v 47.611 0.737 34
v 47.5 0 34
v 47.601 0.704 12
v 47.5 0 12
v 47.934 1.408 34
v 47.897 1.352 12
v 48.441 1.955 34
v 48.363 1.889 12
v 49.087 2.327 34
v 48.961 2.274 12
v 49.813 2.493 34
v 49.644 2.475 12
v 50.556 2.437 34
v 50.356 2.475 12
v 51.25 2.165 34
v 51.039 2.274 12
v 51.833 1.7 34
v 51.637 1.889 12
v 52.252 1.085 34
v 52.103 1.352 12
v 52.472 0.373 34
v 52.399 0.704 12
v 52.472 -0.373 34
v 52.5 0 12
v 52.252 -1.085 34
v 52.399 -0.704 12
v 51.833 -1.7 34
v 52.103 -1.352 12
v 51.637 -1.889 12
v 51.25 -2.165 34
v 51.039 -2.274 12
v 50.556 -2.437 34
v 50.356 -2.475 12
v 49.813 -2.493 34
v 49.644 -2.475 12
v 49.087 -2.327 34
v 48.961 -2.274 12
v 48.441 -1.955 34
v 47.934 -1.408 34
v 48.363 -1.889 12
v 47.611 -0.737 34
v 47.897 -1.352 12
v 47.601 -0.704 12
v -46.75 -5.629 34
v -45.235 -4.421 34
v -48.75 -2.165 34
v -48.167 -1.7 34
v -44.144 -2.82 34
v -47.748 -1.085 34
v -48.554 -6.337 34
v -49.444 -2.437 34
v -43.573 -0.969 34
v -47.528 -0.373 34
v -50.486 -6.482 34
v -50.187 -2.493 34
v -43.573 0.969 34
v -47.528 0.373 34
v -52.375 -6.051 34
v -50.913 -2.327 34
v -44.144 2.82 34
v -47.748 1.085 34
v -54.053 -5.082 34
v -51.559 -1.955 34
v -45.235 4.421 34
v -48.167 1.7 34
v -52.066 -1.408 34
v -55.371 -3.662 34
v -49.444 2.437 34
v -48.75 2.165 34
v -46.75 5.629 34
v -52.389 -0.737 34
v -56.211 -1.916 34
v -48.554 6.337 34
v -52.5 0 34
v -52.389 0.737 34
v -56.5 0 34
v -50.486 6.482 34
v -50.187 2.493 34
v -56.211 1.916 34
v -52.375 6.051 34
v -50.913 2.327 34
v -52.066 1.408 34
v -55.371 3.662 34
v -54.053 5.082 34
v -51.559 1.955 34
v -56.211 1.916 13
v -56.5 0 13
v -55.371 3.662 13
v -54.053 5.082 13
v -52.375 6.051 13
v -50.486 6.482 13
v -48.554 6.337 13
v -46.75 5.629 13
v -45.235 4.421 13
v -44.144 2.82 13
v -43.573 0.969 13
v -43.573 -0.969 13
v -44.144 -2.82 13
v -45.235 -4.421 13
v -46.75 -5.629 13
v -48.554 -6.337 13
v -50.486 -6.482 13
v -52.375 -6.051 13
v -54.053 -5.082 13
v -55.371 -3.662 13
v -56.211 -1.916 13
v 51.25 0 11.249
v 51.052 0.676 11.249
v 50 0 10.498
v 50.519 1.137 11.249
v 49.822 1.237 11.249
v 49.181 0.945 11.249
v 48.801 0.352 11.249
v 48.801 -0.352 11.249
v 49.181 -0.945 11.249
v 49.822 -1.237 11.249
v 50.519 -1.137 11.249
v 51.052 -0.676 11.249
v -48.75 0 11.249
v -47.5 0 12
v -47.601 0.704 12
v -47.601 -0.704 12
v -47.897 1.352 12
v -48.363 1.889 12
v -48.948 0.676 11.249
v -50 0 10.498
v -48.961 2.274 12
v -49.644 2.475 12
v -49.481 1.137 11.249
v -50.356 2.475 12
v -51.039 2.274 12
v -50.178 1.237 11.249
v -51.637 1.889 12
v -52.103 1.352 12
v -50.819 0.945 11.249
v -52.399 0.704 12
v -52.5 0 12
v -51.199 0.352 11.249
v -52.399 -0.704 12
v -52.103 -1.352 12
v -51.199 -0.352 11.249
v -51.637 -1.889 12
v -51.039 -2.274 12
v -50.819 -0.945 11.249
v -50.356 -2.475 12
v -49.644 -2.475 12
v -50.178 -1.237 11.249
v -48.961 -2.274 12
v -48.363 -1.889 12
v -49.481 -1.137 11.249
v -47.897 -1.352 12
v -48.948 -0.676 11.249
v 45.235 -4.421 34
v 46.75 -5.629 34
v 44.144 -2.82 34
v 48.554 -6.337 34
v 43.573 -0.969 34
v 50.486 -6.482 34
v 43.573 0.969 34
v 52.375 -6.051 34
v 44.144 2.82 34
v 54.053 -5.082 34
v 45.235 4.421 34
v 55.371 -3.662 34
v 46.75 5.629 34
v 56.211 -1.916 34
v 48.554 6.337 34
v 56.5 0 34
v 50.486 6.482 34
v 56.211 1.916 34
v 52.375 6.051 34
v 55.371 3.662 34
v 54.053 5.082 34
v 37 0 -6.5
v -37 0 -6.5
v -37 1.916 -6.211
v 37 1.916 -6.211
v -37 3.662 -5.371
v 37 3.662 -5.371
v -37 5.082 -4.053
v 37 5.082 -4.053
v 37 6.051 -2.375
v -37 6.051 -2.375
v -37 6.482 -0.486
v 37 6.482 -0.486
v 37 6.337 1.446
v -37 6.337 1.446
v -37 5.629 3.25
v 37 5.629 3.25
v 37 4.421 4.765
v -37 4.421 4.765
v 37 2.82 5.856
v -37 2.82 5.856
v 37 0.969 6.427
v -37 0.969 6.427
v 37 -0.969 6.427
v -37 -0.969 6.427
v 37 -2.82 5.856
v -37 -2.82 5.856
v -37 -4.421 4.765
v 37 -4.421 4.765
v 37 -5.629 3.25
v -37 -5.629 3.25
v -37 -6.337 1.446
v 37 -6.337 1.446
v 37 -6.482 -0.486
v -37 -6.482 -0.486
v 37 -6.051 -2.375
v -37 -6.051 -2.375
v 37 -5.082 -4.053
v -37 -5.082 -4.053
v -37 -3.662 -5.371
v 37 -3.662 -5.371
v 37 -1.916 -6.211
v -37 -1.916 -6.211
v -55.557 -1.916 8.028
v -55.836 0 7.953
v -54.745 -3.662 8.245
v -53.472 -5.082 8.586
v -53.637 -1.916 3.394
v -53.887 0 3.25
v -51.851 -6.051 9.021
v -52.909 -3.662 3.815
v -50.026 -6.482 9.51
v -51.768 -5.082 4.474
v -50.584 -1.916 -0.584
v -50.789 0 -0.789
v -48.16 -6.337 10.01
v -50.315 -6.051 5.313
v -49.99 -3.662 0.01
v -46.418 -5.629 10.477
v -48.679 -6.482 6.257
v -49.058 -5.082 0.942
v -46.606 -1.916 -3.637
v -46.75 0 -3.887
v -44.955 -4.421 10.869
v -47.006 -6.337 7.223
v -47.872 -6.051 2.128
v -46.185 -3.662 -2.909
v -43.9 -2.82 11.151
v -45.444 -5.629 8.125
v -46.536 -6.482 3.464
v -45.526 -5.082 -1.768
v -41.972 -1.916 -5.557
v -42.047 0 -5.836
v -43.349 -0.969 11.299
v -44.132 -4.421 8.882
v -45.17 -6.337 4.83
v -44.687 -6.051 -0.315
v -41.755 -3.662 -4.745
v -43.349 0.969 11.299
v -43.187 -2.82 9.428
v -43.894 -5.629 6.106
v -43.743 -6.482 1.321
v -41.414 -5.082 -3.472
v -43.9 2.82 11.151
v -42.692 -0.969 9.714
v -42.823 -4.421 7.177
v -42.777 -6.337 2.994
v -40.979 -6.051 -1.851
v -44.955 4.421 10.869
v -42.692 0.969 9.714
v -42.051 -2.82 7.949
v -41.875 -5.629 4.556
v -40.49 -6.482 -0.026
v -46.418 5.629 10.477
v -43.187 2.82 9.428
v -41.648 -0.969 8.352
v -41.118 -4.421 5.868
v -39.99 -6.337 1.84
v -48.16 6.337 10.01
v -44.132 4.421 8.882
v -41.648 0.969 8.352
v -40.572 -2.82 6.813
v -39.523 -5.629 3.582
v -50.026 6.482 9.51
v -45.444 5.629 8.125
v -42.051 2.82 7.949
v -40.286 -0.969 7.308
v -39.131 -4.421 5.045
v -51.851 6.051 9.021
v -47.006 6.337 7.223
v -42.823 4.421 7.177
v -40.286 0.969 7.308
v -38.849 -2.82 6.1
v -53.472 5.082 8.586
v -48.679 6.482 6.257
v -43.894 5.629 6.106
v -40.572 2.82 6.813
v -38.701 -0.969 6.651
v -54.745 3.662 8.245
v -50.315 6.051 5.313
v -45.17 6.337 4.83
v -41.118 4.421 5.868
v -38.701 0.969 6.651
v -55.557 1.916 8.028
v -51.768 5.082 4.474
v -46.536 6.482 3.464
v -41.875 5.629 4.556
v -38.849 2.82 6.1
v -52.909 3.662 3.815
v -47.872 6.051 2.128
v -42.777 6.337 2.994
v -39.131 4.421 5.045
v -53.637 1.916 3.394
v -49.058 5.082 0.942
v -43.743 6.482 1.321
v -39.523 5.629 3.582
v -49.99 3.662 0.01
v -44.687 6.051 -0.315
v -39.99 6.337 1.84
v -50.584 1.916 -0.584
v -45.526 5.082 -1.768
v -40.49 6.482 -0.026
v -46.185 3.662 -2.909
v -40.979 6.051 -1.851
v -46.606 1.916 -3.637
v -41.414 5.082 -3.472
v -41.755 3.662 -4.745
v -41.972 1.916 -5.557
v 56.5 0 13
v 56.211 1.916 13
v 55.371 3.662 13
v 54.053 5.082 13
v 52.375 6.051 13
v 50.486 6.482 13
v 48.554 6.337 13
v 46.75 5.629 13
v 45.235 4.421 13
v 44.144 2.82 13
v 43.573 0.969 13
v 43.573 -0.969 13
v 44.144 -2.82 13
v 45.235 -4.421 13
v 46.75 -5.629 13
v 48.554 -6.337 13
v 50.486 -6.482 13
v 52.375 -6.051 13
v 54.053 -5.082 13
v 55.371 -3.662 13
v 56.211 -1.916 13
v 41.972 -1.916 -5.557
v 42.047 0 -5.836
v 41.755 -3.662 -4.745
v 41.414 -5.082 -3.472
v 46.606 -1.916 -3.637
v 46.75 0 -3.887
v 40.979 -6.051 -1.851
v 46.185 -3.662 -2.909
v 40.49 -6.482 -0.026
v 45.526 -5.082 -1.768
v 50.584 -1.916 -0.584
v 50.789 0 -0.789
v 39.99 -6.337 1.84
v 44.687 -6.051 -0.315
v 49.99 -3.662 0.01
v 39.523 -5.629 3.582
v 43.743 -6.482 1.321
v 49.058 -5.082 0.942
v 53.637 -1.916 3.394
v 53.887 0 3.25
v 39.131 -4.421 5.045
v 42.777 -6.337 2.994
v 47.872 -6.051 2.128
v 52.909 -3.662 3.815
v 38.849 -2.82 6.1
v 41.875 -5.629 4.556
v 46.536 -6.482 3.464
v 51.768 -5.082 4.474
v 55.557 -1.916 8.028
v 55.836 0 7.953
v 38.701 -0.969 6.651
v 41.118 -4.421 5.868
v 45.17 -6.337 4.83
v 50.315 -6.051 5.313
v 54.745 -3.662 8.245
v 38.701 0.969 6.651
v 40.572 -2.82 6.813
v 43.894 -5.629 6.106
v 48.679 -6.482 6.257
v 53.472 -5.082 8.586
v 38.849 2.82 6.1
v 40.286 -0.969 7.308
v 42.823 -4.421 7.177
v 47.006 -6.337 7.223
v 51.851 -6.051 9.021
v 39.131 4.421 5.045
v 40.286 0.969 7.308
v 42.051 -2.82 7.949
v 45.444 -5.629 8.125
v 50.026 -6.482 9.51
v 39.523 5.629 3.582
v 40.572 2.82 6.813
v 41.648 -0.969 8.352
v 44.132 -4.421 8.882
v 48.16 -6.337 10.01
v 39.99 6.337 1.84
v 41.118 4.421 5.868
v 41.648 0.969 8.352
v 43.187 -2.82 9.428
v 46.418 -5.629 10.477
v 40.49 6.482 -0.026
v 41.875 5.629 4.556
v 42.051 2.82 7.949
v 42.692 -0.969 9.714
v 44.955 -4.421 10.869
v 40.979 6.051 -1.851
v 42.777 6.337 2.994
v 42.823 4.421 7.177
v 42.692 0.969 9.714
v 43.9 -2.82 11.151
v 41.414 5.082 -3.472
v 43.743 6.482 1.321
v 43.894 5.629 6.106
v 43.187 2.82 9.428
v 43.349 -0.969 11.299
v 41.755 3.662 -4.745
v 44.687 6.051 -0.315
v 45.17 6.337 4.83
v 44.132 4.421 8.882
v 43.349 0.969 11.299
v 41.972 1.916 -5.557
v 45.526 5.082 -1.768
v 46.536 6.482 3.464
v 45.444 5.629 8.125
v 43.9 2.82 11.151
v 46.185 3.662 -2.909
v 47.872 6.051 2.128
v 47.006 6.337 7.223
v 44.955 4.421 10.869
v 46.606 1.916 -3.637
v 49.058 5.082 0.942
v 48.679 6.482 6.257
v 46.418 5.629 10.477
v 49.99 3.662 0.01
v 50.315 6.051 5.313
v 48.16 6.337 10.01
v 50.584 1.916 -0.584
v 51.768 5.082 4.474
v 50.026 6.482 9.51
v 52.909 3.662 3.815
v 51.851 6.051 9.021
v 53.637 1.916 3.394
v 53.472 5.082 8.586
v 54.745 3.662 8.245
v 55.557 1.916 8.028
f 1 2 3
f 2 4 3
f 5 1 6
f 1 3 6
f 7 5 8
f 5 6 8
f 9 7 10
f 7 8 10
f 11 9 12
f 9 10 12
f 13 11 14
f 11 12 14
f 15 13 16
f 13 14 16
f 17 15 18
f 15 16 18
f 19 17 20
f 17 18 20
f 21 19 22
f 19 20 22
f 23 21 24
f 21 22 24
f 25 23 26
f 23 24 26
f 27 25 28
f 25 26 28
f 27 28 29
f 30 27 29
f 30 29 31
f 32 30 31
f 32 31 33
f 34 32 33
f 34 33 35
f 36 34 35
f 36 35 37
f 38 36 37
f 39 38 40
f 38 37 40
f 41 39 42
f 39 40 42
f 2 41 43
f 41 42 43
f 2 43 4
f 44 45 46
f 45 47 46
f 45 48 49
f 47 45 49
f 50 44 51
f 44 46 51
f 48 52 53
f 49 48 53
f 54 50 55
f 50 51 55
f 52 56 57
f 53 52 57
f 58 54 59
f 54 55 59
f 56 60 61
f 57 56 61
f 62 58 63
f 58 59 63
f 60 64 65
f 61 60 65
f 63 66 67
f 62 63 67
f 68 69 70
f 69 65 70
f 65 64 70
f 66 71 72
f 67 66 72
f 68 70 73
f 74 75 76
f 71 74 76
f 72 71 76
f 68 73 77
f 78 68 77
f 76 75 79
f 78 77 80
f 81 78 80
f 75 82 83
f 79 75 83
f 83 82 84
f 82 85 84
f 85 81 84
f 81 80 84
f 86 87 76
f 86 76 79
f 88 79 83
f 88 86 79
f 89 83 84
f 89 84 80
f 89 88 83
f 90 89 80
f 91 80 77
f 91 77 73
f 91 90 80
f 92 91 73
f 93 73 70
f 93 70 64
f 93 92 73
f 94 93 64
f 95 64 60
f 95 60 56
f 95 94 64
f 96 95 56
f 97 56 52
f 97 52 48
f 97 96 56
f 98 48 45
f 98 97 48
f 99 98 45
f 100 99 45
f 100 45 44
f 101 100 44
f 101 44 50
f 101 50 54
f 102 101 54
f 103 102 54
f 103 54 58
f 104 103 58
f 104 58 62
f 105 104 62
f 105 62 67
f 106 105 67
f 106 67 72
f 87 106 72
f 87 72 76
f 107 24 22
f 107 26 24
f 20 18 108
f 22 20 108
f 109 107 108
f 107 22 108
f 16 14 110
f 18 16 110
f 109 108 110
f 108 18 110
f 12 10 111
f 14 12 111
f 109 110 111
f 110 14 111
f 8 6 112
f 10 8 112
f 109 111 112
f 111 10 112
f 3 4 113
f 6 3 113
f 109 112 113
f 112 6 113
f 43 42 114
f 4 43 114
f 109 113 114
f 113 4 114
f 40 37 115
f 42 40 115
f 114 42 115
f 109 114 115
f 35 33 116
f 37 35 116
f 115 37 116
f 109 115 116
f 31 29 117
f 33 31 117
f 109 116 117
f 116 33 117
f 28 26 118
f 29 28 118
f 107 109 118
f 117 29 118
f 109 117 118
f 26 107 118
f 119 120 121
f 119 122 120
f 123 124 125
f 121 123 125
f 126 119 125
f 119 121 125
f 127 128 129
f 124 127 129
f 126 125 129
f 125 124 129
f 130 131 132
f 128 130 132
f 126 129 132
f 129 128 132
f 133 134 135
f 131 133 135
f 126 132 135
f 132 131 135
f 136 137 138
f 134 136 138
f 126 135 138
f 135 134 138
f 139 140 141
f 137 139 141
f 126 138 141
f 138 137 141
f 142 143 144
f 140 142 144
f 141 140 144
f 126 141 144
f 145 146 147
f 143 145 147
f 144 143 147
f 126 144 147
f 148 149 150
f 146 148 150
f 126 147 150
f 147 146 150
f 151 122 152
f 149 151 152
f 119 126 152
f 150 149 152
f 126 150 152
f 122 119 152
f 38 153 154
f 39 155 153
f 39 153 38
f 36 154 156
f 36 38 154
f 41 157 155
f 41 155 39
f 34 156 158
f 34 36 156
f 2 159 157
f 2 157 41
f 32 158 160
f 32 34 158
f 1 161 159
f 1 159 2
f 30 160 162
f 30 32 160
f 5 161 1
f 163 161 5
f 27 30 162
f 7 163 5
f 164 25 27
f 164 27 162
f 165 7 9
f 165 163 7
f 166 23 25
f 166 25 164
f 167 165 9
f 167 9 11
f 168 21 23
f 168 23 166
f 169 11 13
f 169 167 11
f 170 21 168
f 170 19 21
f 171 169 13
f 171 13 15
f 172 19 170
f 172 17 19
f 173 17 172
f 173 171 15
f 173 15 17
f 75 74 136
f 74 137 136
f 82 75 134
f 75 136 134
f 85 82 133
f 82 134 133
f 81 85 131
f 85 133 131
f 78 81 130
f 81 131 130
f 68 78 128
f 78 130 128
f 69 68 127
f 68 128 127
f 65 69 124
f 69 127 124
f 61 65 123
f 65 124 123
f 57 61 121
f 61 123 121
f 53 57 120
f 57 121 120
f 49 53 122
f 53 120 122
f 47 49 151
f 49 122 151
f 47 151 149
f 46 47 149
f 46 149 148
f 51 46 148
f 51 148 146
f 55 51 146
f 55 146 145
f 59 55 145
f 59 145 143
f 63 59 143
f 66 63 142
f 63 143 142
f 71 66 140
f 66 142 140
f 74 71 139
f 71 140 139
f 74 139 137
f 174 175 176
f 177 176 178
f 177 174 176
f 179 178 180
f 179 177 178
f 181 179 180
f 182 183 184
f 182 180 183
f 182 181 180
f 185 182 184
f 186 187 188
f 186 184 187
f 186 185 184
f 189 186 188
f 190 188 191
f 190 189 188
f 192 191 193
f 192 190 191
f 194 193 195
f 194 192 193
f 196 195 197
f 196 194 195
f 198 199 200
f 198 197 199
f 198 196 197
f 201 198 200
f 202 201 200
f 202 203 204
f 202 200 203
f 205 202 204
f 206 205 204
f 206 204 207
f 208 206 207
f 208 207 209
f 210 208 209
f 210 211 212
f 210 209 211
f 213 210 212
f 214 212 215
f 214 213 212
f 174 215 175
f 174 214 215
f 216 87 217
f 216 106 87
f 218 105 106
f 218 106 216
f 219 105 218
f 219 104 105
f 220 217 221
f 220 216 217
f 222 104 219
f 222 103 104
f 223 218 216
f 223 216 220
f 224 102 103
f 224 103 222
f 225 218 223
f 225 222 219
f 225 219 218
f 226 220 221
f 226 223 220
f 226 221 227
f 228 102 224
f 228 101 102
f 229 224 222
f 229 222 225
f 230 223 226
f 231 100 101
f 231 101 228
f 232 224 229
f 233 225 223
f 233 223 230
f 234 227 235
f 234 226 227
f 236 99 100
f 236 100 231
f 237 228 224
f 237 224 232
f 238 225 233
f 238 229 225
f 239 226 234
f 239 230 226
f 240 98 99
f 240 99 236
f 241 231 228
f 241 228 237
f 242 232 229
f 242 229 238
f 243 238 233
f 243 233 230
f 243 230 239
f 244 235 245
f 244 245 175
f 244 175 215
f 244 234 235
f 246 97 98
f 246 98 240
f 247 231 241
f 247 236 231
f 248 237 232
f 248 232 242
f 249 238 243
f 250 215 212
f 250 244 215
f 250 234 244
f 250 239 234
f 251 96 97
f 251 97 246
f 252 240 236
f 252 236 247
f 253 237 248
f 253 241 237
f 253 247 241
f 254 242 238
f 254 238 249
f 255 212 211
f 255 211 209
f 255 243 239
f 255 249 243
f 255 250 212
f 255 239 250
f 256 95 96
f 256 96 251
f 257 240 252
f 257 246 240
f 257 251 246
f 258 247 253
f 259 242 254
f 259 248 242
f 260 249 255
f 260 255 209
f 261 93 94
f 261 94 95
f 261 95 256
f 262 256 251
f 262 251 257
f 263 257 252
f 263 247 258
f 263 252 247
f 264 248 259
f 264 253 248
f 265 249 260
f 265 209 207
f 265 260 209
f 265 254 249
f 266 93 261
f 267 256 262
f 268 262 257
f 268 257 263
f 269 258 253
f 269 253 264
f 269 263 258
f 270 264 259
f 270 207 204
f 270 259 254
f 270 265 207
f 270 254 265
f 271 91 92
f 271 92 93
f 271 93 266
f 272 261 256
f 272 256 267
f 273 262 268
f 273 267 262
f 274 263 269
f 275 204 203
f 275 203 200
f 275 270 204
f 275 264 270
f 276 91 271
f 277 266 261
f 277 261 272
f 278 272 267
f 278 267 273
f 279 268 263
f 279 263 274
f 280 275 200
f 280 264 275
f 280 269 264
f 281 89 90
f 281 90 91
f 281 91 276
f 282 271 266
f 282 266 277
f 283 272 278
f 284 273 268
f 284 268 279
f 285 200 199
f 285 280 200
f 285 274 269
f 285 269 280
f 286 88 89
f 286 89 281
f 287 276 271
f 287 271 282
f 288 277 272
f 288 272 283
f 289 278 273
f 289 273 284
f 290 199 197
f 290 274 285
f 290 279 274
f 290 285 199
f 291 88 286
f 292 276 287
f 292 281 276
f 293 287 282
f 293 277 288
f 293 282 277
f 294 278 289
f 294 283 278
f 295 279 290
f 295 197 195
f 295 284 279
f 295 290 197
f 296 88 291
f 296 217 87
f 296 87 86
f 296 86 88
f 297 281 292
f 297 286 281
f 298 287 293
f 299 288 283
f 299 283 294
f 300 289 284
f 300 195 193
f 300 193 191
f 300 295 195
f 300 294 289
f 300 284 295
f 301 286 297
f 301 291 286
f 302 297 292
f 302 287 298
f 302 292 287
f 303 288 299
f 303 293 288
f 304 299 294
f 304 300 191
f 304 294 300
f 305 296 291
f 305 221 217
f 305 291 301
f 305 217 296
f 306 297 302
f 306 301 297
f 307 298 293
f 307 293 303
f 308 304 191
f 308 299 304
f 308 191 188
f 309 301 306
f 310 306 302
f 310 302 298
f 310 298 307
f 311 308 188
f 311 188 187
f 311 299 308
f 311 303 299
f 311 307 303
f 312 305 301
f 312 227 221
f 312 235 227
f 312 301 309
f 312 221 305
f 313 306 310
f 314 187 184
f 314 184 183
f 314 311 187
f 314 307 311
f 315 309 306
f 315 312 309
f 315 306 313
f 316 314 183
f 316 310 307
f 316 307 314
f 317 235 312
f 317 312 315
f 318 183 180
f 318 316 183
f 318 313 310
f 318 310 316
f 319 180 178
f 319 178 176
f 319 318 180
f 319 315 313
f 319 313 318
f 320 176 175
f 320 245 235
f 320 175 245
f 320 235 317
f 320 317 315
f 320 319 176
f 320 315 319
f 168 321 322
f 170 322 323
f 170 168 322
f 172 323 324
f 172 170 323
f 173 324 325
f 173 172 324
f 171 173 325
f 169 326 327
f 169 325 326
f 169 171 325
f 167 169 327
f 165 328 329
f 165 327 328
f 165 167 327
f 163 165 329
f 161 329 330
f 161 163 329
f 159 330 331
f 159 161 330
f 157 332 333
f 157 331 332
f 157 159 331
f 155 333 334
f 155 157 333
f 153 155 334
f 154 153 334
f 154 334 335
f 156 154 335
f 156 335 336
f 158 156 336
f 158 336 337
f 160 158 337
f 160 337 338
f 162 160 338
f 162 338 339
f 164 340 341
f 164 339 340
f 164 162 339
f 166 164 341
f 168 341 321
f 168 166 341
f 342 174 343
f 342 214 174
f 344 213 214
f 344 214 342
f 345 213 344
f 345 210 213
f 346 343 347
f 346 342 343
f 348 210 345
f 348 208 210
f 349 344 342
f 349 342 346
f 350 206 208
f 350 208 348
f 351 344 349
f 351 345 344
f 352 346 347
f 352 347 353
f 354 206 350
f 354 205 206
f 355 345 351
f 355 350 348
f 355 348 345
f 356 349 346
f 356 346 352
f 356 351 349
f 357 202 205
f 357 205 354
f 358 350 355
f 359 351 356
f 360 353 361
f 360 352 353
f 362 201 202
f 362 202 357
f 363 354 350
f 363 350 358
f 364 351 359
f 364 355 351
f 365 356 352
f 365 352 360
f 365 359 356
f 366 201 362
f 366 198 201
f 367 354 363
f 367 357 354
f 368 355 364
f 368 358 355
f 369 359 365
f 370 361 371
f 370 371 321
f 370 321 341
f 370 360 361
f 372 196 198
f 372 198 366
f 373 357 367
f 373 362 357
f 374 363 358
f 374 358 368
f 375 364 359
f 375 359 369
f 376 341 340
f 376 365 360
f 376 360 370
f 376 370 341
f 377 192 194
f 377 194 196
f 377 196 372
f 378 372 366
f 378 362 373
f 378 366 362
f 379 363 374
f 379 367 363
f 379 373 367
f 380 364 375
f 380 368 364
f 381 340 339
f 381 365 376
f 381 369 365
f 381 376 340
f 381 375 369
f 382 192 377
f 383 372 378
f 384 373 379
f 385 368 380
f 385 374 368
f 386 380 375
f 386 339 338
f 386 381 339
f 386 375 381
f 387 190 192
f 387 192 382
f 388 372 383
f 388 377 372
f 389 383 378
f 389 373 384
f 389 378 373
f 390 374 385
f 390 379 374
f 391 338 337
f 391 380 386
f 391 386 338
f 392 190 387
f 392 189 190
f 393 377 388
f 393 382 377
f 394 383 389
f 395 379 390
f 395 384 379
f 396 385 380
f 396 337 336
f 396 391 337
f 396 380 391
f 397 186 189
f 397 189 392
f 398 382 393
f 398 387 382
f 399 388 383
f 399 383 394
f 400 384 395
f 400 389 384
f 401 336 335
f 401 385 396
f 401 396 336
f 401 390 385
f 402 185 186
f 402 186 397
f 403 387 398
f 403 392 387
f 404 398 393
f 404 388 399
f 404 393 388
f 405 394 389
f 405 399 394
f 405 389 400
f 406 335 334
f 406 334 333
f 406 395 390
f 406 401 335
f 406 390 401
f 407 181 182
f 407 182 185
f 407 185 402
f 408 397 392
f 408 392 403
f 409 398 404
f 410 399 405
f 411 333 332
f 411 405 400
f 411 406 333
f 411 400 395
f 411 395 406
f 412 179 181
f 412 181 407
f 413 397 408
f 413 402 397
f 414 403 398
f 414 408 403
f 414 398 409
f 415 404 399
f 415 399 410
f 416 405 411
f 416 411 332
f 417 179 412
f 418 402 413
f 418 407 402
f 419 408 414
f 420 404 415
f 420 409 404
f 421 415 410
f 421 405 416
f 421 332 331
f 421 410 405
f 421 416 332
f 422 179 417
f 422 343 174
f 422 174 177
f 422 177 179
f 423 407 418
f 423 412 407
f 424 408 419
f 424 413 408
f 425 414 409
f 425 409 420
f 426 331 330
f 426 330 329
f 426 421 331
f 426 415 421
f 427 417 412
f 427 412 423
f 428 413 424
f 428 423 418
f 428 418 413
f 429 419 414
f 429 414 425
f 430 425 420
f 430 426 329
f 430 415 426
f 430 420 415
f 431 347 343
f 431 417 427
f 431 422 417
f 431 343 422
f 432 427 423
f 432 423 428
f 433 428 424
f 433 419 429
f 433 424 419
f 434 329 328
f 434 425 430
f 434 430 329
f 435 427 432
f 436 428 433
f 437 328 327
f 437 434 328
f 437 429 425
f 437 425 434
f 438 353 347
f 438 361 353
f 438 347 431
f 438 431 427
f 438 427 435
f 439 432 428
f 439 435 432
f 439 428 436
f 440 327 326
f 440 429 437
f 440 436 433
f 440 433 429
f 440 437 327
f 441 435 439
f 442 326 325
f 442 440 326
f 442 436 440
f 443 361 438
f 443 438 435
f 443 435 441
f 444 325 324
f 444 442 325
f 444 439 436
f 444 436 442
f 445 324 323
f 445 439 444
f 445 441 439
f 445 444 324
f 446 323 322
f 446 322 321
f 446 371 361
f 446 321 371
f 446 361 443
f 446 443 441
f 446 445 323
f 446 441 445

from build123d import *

# Parameters (mm, degrees)
SWEEP1_PROFILE_R                = 6.5
TAP_DRILL_FOR_M6X1_0_TAP1_D     = 5
TAP_DRILL_FOR_M6X1_0_TAP1_DEPTH = 22
TAP_DRILL_FOR_M6X1_0_TAP1_TIP   = 1.502151548


with BuildPart() as part:
    # Sweep1: sweep along a path in Sketch1
    with BuildLine(Plane(origin=(0, 0, 0), x_dir=(1, 0, 0), z_dir=(0, 1, 0))) as sweep1_path:
        Line((-50, -34), (-50, -13))
        ThreePointArc((-50, -13), (-46.192388155, -3.807611845), (-37, 0))
        Line((-37, 0), (37, 0))
        ThreePointArc((37, 0), (46.192388155, -3.807611845), (50, -13))
        Line((50, -13), (50, -34))
    # Sweep1 profile (on start of the path) → Sweep1 (sweep)
    with BuildSketch(Plane(origin=(-50, 0, 34), x_dir=(-1, 0, 0), z_dir=(0, 0, -1))):
        Circle(SWEEP1_PROFILE_R)
    sweep(path=sweep1_path.line)

    # Tap Drill for M6x1.0 Tap1
    with Locations(Plane.XY.offset(34)):
        with Locations((-50, 0), (50, 0)):
            Hole(TAP_DRILL_FOR_M6X1_0_TAP1_D / 2, depth=TAP_DRILL_FOR_M6X1_0_TAP1_DEPTH)
            with Locations((0, 0, -(TAP_DRILL_FOR_M6X1_0_TAP1_DEPTH + TAP_DRILL_FOR_M6X1_0_TAP1_TIP / 2))):  # 118° drill point
                Cone(0, TAP_DRILL_FOR_M6X1_0_TAP1_D / 2, TAP_DRILL_FOR_M6X1_0_TAP1_TIP, mode=Mode.SUBTRACT)


solid = part.part
